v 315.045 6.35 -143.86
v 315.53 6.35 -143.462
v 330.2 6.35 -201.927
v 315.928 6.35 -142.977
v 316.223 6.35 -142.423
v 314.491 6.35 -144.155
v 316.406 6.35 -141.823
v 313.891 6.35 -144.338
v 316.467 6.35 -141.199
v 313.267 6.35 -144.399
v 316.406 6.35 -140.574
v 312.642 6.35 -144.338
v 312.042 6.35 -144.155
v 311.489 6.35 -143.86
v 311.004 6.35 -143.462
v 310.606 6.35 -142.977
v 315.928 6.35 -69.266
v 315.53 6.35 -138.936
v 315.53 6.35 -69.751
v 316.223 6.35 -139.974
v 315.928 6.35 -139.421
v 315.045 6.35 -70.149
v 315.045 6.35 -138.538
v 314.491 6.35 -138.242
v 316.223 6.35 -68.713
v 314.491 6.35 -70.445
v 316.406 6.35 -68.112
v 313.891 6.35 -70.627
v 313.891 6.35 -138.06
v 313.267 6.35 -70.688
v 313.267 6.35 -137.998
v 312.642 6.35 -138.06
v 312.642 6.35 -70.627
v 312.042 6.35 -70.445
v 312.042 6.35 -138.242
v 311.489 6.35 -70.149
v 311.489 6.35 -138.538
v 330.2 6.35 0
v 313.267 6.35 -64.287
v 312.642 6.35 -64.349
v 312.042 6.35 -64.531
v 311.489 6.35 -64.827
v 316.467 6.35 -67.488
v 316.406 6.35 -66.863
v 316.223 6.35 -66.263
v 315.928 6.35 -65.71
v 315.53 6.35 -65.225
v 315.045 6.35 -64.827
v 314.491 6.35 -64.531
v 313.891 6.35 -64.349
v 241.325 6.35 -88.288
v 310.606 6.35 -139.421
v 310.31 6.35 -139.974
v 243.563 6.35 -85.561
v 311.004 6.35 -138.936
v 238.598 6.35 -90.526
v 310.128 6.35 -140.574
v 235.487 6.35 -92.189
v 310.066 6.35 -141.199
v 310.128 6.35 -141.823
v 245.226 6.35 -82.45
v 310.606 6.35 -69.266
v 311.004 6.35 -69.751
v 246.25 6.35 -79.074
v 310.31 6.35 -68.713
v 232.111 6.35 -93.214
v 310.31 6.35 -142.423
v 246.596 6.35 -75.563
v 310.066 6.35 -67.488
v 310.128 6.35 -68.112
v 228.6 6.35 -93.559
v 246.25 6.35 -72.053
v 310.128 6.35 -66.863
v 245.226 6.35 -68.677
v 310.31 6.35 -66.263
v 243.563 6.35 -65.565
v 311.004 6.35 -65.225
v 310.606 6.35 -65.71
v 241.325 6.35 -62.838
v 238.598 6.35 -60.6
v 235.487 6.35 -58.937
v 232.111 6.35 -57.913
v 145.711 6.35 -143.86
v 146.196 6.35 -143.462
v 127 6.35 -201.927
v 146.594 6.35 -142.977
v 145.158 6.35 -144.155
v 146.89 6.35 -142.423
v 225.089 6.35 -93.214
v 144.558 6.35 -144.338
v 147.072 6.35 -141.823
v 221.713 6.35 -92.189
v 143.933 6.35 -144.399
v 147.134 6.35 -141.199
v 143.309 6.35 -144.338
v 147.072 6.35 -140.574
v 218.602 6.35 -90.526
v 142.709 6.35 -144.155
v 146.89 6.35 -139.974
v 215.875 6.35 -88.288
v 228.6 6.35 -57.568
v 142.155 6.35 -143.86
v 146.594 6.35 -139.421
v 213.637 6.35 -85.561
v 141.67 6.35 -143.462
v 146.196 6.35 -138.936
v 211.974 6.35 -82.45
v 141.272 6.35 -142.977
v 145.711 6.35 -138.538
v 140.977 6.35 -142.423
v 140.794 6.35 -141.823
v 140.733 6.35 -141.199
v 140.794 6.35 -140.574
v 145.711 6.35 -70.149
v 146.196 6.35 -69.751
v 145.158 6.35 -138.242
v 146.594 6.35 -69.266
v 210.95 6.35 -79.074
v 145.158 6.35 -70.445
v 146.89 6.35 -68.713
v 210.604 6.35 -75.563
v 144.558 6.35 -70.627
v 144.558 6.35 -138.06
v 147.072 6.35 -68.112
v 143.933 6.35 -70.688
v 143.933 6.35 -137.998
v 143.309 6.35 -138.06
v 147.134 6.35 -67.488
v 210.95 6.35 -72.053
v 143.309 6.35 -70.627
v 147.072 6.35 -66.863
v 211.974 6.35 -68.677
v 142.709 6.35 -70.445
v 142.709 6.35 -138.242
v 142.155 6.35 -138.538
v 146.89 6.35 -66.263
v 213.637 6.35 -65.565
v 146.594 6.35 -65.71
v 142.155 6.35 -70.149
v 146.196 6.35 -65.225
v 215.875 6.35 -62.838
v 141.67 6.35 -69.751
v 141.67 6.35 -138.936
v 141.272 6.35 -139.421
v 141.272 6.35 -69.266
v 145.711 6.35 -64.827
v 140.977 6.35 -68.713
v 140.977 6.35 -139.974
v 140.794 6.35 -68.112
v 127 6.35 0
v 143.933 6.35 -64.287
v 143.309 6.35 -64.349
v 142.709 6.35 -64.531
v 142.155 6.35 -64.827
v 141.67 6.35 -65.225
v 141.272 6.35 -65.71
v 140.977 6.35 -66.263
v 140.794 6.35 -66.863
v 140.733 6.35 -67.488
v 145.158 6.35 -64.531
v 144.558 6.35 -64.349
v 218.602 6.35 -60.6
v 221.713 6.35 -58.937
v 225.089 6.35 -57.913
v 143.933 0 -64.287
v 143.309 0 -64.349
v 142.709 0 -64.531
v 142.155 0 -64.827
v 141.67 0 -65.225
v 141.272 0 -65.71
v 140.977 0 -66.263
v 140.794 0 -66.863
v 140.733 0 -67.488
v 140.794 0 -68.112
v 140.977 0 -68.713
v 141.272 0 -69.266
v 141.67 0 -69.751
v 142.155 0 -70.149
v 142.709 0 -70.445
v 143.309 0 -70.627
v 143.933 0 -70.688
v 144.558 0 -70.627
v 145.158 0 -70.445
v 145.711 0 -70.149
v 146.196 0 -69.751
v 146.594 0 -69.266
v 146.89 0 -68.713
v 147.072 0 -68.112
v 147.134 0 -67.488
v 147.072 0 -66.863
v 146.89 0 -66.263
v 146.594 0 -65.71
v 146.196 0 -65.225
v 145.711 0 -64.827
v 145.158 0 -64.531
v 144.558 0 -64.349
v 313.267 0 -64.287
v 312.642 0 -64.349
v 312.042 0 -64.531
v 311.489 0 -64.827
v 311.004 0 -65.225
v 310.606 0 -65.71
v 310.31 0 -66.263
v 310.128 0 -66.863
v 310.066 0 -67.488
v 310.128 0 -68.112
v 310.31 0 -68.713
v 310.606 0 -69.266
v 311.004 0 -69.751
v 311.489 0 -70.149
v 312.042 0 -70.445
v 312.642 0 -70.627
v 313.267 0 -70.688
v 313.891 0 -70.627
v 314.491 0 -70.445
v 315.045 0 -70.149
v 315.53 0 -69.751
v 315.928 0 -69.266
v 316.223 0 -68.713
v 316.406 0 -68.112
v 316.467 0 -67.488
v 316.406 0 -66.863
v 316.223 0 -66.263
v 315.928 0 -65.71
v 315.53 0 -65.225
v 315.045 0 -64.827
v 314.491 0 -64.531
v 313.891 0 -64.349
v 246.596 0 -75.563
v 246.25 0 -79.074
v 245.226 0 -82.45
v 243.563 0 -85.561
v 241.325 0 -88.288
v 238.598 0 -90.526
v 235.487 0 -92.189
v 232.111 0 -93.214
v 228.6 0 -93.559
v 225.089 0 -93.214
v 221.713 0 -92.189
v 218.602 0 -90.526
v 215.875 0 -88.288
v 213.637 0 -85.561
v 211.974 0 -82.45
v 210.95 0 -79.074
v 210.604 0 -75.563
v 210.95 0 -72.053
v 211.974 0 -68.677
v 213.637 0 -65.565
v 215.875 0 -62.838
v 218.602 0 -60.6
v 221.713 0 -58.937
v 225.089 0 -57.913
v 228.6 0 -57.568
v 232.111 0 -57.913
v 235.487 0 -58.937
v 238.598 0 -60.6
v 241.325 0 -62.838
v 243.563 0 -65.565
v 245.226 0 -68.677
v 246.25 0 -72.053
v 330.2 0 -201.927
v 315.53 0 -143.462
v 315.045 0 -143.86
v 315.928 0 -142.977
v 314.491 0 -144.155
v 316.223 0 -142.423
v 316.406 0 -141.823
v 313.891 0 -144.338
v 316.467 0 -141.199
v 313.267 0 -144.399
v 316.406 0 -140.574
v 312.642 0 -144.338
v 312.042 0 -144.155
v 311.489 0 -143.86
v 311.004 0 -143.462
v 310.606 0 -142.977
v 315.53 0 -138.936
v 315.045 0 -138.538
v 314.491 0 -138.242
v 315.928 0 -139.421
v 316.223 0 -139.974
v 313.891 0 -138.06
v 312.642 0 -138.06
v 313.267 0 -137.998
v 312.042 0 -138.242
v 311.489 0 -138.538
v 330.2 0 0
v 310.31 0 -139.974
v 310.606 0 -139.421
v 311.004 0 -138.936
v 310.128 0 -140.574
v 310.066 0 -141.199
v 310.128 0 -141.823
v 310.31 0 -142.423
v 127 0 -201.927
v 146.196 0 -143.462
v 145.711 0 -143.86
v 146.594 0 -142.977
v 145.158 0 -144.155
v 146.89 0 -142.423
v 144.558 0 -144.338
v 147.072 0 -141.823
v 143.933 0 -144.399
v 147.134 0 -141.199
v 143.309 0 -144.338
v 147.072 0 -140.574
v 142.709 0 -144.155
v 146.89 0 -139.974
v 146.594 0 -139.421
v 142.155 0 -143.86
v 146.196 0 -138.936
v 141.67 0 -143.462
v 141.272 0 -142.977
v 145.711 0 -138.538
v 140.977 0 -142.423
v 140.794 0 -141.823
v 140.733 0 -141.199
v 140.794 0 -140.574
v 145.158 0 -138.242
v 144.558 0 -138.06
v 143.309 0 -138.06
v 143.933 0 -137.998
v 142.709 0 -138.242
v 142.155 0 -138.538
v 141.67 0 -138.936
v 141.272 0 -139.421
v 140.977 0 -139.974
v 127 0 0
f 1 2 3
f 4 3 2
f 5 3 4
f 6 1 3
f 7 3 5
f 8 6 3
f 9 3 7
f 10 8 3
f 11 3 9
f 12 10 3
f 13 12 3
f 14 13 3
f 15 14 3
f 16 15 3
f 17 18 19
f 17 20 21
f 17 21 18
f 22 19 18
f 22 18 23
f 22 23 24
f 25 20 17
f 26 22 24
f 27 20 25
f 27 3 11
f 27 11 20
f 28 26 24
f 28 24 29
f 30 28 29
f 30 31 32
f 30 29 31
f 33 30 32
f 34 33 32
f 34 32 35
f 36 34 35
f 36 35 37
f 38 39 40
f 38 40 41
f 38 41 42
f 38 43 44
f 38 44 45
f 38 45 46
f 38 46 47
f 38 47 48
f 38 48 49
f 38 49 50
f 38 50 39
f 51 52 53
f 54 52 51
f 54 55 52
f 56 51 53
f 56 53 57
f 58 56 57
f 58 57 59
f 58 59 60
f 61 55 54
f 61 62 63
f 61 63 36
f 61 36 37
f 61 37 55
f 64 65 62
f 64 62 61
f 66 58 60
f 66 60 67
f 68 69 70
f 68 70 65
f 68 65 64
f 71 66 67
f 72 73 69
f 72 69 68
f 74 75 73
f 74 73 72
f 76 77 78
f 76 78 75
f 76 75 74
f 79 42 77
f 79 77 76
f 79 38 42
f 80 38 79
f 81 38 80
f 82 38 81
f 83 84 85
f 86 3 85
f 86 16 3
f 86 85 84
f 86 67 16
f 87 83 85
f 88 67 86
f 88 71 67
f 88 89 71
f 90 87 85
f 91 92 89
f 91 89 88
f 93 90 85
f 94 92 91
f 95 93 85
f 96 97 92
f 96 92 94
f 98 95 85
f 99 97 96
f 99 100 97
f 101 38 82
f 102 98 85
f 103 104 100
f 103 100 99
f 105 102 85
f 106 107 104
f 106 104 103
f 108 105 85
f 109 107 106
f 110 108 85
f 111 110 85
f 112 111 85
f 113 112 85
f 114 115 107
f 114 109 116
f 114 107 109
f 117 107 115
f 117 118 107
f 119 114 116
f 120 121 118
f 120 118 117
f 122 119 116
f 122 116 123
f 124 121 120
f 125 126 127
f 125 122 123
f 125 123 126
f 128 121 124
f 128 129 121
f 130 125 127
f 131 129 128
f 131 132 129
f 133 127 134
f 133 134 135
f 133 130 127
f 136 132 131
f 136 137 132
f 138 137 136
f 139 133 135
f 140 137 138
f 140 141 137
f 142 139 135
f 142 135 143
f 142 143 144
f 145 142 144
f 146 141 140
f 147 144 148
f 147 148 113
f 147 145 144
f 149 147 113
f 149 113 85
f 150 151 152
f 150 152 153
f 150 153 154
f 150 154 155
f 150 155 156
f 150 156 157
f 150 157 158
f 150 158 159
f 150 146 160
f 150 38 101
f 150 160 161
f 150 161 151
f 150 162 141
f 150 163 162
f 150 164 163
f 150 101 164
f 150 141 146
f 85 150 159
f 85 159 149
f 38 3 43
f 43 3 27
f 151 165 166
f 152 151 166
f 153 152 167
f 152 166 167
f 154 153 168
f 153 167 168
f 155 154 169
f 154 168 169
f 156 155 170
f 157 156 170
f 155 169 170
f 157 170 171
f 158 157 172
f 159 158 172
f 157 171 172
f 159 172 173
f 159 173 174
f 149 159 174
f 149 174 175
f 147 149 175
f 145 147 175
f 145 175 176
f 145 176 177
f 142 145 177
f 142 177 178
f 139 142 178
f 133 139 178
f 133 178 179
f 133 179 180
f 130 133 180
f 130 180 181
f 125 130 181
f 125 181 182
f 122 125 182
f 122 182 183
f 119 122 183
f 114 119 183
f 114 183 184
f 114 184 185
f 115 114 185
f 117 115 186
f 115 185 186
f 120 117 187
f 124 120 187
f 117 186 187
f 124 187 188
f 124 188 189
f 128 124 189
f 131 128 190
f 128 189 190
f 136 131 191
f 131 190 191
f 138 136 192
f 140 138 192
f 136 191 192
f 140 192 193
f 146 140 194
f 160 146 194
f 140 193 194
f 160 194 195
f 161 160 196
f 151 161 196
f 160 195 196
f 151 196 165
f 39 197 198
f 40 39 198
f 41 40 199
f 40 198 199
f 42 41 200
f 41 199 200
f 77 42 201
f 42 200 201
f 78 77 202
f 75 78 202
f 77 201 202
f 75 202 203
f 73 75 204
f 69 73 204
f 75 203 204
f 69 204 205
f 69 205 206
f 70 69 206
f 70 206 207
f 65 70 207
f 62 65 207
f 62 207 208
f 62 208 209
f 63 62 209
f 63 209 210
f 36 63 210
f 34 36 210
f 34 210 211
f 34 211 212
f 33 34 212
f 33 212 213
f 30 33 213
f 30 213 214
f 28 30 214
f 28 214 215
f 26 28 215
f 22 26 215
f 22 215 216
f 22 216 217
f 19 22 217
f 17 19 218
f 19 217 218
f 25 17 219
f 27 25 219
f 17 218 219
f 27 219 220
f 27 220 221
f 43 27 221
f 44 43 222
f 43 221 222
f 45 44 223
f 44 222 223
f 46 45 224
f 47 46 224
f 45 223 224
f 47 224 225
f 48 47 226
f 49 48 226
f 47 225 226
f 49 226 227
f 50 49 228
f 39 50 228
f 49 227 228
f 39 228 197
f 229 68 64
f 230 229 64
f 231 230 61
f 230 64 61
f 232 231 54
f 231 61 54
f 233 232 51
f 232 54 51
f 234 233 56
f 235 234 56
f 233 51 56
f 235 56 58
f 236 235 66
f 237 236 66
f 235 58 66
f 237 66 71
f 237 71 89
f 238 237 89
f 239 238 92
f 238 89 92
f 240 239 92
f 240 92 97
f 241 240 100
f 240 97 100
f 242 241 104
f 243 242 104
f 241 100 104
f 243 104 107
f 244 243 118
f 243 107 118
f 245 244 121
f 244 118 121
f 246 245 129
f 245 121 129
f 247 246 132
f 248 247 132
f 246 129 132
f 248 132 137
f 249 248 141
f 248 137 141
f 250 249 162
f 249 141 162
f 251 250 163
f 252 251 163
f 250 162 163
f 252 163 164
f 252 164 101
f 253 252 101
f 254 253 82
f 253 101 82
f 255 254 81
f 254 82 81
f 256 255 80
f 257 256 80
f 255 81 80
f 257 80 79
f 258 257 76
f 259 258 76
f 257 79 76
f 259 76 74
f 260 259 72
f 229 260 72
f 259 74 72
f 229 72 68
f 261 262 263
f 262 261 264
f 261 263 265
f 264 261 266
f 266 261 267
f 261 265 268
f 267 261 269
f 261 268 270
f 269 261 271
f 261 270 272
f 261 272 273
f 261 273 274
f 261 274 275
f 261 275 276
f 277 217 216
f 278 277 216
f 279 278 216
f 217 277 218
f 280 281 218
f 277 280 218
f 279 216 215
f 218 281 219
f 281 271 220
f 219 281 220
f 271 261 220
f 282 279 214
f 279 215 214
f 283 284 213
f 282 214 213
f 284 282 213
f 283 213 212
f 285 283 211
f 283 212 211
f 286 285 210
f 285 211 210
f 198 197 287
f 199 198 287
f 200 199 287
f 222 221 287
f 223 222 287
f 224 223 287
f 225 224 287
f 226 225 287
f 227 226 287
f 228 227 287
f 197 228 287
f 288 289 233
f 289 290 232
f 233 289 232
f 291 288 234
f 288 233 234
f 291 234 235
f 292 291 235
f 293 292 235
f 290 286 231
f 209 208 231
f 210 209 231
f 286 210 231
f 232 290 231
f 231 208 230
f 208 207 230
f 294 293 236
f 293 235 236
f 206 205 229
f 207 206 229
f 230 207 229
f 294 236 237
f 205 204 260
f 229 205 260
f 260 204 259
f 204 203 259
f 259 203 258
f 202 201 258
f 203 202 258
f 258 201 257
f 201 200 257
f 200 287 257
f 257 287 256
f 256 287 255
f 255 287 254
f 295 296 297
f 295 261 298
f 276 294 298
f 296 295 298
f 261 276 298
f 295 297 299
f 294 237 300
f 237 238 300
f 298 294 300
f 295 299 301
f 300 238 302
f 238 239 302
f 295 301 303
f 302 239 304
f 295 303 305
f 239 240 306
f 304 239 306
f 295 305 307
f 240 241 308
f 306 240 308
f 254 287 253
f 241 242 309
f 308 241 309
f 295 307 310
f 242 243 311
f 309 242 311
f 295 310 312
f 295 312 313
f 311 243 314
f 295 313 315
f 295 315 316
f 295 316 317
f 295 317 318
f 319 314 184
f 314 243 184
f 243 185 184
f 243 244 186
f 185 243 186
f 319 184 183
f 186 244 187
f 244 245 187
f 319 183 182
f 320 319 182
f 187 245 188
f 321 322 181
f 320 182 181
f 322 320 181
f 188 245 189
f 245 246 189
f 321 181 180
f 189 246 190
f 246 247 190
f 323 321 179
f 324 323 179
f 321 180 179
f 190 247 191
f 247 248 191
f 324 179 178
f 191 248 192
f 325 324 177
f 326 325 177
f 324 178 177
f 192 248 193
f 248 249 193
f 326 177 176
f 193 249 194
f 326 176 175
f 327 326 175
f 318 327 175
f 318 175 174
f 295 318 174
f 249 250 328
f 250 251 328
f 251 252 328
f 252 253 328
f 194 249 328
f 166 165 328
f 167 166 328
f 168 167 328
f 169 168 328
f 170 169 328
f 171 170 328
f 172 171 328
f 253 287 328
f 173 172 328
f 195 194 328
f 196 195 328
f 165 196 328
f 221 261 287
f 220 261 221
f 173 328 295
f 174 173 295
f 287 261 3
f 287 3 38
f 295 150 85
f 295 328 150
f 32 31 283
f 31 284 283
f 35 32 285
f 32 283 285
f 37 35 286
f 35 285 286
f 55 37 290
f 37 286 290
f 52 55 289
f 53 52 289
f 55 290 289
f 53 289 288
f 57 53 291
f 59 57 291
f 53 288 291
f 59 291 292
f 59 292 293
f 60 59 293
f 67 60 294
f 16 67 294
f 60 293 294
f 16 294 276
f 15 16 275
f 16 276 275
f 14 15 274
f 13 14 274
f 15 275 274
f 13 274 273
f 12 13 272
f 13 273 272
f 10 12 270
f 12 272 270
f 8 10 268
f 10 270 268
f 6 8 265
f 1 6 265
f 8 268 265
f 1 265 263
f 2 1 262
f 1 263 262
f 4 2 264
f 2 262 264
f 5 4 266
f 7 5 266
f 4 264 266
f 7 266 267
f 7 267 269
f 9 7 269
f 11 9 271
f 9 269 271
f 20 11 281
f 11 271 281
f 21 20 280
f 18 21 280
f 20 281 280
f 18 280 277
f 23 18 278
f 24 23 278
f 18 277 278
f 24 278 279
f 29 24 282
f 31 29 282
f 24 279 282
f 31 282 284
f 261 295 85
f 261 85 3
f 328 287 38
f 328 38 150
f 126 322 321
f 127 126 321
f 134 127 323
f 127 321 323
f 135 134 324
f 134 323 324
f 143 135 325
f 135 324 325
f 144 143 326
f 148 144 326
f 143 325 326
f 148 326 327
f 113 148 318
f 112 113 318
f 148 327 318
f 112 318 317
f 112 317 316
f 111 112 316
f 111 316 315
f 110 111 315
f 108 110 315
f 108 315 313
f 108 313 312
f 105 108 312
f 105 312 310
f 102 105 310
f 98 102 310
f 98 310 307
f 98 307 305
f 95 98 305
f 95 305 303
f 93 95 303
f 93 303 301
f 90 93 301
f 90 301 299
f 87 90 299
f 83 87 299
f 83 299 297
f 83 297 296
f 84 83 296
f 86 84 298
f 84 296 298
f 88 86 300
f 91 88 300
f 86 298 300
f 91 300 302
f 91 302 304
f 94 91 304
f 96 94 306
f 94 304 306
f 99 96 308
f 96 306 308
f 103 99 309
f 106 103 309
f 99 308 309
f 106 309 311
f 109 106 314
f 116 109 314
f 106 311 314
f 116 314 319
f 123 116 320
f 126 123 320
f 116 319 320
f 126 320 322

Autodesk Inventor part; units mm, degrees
ref_plane "YZ Plane" through (0, 0, 0) normal (1, 0, 0) x (0, 1, 0)
ref_plane "XZ Plane" through (0, 0, 0) normal (0, 1, 0) x (-1, 0, 0)
ref_plane "XY Plane" through (0, 0, 0) normal (0, 0, 1) x (1, 0, 0)
sketch "Sketch1" plane through (0, 0, 0) normal (0, 1, 0) x (-1, 0, 0)
  line L0 (-330.2, -201.9268) -> (-330.2, 0)
  line L1 (-127, -201.9268) -> (-330.2, -201.9268)
  line L2 (-330.2, 0) -> (-127, 0)
  line L3 (-127, 0) -> (-127, -201.9268)
  point P0 (0, 0)
  dimension "d136" = 203.2
extrude "Extrusion1" add sketch "Sketch1" along normal blind 6.35
sketch "Sketch2" plane through (0, 6.35, 0) normal (0, 1, 0) x (1, 0, 0)
  circle A0 centre (143.9333, 141.1986) radius 2.6501
  circle A1 centre (143.9333, 67.4878) radius 2.6501
  circle A2 centre (313.2667, 141.1986) radius 2.6501
  circle A3 centre (313.2667, 67.4878) radius 2.6501
  line L0 (330.2, 0) -> (127, 0)
  line L1 (127, 0) -> (330.2, 0) projected
  line L2 (330.2, 0) -> (330.2, 201.9268) projected
  line L3 (330.2, 0) -> (330.2, 201.9268)
  line L4 (330.2, 201.9268) -> (127, 201.9268)
  line L5 (127, 201.9268) -> (127, 0) projected
  line L6 (127, 201.9268) -> (127, 0)
  point P0 (127, 19.4733)
  point P1 (330.2, 149.86)
  point P2 (228.6, 0)
  dimension "d137" = 203.2
hole "Hole9" at (143.9333, 6.35, -141.1986) direction (0, -1, 0) diameter 6.4008 end through all thread size "5/16-18 UNC" class "2B" standard "ANSI Unified Screw Threads"
hole "Hole10" at (143.9333, 6.35, -67.4878) direction (0, -1, 0) diameter 6.4008 end through all thread size "5/16-18 UNC" class "2B" standard "ANSI Unified Screw Threads"
hole "Hole11" at (313.2667, 6.35, -141.1986) direction (0, -1, 0) diameter 6.4008 end through all thread size "5/16-18 UNC" class "2B" standard "ANSI Unified Screw Threads"
hole "Hole12" at (313.2667, 6.35, -67.4878) direction (0, -1, 0) diameter 6.4008 end through all thread size "5/16-18 UNC" class "2B" standard "ANSI Unified Screw Threads"
sketch "Sketch3" plane through (0, 6.35, 0) normal (0, 1, 0) x (1, 0, 0)
  circle A0 centre (228.6, 75.5634) radius 17.9959
  point P0 (0, 0)
  point P1 (127, 201.9268)
extrude "Extrusion2" cut sketch "Sketch3" against normal blind 50.8
equation "\"d97\" = d12"
equation "\"d104\" = d12"
equation "\"d111\" = d12"
equation "\"d12\" = 7.9375"
properties part number "base_plate"
